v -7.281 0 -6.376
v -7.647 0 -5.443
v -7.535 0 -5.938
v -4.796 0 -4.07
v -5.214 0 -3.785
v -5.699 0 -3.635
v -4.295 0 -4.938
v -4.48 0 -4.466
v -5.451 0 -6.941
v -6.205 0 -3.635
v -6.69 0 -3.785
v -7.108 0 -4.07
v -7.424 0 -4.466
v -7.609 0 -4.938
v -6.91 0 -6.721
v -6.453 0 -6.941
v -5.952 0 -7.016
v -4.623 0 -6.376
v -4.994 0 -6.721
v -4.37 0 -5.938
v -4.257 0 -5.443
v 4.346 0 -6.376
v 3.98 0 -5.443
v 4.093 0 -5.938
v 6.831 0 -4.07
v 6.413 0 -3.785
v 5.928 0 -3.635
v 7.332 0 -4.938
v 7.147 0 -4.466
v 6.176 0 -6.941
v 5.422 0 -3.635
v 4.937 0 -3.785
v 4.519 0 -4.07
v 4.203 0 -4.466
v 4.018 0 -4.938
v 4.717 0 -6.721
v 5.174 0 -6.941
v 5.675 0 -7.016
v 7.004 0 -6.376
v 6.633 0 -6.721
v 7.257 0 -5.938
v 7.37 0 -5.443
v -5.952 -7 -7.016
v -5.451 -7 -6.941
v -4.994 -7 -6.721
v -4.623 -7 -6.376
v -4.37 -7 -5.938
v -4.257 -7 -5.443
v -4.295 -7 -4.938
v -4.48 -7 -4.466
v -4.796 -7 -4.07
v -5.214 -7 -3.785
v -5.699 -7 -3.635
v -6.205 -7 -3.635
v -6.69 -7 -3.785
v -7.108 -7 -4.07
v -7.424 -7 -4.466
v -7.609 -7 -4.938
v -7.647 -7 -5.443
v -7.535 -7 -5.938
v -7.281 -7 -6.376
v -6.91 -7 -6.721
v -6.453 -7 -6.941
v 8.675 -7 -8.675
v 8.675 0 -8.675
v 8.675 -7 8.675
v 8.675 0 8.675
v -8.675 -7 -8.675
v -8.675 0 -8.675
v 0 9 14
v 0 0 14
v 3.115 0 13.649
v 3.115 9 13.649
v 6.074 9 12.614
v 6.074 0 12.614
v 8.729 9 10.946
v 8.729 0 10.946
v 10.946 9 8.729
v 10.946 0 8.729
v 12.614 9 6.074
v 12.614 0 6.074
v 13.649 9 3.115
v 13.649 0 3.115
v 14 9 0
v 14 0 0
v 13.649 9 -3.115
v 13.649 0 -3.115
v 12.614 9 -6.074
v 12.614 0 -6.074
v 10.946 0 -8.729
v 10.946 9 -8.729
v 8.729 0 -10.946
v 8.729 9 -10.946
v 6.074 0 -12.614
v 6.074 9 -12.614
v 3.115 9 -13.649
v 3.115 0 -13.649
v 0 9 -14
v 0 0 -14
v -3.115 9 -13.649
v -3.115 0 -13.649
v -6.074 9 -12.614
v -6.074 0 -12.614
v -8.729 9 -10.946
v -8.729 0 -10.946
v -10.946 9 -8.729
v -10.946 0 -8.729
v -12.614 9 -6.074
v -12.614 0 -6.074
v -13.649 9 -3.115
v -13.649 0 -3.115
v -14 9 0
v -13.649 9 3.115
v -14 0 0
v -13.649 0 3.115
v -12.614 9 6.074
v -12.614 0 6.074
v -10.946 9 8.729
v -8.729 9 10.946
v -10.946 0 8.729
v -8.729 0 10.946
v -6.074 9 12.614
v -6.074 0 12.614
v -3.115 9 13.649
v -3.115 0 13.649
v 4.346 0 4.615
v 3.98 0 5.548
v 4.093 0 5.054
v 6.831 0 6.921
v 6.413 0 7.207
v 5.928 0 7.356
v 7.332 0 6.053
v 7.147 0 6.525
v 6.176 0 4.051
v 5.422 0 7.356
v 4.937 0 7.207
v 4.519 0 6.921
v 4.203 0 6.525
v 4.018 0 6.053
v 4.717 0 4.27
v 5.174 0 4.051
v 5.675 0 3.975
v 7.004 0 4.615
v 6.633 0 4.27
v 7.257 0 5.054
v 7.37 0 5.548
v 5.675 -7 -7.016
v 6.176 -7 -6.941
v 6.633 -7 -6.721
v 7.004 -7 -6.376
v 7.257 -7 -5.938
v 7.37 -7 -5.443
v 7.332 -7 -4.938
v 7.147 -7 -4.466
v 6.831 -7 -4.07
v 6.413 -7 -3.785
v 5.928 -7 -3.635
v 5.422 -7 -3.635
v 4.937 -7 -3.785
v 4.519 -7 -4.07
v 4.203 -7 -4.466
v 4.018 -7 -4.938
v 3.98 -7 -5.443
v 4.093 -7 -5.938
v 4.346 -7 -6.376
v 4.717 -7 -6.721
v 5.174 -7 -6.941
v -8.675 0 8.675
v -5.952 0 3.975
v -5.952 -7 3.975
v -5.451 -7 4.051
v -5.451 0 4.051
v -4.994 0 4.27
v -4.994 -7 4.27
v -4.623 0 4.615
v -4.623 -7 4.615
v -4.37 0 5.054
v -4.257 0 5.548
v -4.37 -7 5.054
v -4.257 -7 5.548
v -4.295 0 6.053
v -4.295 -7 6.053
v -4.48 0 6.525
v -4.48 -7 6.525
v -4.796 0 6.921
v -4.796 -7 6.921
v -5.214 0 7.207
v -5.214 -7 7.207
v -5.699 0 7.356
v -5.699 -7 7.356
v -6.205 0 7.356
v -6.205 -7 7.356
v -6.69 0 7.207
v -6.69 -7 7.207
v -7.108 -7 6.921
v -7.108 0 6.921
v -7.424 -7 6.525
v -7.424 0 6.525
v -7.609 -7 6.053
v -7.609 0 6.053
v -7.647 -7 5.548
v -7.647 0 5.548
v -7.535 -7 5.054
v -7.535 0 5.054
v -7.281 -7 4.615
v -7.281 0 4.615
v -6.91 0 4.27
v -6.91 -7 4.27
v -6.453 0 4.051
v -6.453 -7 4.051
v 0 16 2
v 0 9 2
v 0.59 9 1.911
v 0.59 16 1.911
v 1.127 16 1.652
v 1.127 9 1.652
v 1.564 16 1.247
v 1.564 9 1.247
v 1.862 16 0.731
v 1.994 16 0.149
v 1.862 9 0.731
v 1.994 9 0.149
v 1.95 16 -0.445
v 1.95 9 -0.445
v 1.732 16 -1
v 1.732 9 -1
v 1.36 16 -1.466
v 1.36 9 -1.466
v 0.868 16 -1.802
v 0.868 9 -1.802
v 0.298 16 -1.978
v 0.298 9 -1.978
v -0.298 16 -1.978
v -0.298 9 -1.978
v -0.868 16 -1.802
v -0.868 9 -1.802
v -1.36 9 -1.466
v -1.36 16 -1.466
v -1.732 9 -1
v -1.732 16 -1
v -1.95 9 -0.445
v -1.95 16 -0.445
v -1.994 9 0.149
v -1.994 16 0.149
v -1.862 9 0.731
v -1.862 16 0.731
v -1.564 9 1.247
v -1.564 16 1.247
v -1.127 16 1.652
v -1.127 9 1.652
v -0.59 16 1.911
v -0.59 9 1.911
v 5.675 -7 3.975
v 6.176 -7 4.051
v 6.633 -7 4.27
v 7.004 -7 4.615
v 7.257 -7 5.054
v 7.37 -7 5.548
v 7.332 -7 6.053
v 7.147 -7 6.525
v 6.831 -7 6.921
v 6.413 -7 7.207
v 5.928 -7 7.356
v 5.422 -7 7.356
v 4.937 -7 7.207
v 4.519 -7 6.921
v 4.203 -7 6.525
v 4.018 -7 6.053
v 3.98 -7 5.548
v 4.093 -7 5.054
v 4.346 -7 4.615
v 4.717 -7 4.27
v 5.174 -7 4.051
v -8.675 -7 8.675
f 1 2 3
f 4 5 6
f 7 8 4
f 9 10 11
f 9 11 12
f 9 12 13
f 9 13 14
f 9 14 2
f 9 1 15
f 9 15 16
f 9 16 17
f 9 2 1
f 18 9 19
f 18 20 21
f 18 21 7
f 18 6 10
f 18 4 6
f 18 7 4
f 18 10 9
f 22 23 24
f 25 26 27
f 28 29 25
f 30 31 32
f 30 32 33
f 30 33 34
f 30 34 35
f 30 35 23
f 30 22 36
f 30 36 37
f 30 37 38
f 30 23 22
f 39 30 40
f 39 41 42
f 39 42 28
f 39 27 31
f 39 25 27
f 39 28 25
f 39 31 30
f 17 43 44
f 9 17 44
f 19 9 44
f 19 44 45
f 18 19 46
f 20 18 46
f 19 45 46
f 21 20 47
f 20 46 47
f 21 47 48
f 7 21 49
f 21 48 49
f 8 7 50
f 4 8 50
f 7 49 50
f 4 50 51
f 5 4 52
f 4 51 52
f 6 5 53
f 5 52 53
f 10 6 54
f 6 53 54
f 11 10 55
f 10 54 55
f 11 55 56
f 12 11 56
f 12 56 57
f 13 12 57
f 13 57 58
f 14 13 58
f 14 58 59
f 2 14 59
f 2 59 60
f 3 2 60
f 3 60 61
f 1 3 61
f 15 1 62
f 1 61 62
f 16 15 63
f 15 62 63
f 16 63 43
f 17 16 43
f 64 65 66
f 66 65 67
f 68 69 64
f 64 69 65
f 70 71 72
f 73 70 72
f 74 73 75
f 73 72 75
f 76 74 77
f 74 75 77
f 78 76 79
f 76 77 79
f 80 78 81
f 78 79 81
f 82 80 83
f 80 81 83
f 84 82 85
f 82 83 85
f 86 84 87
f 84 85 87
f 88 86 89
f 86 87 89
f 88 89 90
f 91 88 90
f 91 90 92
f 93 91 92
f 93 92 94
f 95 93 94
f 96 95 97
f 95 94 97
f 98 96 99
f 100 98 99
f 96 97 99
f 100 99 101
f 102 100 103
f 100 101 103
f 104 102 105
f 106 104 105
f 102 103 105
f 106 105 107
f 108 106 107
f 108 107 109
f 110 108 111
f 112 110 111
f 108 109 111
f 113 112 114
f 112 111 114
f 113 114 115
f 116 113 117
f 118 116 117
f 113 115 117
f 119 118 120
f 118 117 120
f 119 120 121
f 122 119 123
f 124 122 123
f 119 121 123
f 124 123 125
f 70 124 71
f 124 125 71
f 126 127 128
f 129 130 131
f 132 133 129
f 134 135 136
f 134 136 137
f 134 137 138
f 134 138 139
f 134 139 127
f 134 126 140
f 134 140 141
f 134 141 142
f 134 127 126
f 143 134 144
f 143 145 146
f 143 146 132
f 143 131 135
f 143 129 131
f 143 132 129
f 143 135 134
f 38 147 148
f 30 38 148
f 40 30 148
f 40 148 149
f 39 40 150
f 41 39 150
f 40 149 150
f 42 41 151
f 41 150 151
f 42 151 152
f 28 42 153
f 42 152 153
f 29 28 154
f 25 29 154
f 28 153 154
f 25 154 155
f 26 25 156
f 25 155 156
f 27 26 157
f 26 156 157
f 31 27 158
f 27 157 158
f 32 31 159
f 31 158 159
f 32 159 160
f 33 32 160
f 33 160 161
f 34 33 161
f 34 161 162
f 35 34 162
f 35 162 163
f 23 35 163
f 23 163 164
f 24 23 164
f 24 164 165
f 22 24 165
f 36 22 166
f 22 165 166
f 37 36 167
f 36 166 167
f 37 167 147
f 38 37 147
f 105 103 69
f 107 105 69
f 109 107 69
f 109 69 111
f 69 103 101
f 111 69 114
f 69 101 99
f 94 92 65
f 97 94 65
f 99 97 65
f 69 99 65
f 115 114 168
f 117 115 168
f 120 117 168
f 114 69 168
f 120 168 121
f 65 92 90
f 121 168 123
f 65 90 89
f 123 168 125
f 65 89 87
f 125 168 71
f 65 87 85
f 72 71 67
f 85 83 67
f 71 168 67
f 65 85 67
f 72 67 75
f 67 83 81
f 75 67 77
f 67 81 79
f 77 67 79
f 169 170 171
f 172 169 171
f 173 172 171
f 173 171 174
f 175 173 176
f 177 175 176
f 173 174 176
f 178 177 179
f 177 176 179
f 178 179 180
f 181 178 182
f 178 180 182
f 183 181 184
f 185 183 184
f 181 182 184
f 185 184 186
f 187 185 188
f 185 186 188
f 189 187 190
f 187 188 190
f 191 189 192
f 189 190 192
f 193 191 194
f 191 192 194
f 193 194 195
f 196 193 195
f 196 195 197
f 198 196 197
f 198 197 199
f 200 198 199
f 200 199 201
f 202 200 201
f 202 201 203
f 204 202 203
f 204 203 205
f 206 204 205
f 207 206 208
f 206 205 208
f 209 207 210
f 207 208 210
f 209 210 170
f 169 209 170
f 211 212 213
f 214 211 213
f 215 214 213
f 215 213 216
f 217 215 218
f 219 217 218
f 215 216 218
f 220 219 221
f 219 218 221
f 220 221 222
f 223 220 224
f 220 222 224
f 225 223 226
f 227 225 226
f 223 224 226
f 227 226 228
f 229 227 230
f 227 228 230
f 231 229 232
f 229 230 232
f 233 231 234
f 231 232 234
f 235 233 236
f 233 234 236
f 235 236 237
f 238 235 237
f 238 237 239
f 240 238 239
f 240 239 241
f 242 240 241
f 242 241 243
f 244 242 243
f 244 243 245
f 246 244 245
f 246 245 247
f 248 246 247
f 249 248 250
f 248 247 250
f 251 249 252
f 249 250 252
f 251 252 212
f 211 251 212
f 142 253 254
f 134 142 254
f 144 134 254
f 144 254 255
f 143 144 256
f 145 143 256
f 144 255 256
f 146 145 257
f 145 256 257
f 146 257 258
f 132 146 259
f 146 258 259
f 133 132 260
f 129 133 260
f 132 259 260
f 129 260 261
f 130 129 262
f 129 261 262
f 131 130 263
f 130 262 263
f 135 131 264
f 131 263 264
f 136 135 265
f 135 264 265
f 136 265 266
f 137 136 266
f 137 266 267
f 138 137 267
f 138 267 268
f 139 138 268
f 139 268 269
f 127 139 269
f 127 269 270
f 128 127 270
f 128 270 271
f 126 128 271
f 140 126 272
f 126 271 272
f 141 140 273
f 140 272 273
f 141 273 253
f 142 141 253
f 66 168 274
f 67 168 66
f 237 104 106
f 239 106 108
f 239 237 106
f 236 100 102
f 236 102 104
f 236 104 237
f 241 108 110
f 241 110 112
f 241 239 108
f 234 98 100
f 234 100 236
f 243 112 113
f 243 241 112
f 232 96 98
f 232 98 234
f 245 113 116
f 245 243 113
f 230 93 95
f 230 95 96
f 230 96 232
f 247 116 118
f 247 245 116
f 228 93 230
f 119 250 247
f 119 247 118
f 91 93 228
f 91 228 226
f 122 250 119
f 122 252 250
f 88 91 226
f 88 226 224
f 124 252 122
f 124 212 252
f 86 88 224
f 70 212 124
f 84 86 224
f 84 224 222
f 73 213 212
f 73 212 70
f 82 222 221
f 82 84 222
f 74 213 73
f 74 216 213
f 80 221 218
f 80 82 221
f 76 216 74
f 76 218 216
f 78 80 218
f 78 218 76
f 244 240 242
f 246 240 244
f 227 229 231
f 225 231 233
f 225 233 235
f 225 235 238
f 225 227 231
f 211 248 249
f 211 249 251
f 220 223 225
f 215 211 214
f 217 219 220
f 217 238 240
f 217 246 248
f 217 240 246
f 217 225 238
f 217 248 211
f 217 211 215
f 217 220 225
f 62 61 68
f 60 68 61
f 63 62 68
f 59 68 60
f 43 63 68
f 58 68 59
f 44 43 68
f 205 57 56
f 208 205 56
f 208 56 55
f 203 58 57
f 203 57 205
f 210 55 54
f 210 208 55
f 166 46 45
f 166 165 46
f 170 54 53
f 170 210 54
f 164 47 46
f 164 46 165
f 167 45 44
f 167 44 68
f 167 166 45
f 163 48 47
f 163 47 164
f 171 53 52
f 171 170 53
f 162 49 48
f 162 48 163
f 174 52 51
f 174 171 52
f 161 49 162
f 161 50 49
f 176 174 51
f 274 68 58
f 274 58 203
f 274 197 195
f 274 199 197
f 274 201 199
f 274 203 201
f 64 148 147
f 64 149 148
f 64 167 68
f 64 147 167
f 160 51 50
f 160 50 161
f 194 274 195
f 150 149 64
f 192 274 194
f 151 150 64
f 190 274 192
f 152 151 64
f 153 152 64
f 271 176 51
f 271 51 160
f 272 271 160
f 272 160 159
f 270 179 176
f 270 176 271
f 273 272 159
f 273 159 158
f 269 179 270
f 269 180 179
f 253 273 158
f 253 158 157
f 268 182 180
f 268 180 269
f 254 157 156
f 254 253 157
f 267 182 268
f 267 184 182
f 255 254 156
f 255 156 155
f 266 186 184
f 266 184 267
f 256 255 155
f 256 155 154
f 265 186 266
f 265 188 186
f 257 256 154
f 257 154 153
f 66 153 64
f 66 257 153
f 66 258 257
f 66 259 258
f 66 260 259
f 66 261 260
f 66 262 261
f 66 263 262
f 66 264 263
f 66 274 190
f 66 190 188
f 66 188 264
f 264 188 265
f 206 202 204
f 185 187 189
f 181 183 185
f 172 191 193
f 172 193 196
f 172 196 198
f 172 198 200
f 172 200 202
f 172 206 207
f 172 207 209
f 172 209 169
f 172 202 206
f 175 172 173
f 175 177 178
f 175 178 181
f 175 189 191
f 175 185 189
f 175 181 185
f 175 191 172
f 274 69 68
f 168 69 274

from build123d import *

# Parameters (mm, degrees)
SKETCH1_R           = 14
BOSS_EXTRUDE1_DEPTH = 9
SKETCH3_W           = 17.35
SKETCH3_H           = 17.35
BOSS_EXTRUDE2_DEPTH = 7
SKETCH4_R           = 1.7
CUT_EXTRUDE1_DEPTH  = 7
SKETCH5_R           = 2
BOSS_EXTRUDE3_DEPTH = 7


with BuildPart() as part:
    # Sketch1 → Boss-Extrude1 (new body)
    with BuildSketch(Plane(origin=(0, 0, 0), x_dir=(1, 0, 0), z_dir=(0, 1, 0))):
        with Locations(Location((0, 0, 0), (0, 0, 270))):
            Circle(SKETCH1_R)
    extrude(amount=BOSS_EXTRUDE1_DEPTH)

    # Sketch3 → Boss-Extrude2 (add)
    with BuildSketch(Plane.XZ):
        Rectangle(SKETCH3_W, SKETCH3_H)
    extrude(amount=BOSS_EXTRUDE2_DEPTH)

    # Sketch4 → Cut-Extrude1 (cut)
    with BuildSketch(Plane.XZ.offset(7)):
        with Locations(Location((-5.952043792, 5.675, 0), (0, 0, 270))):
            Circle(SKETCH4_R)
        with Locations(Location((-5.952043792, -5.316444521, 0), (0, 0, 270))):
            Circle(SKETCH4_R)
        with Locations(Location((5.675, -5.316444521, 0), (0, 0, 270))):
            Circle(SKETCH4_R)
        with Locations(Location((5.675, 5.675, 0), (0, 0, 270))):
            Circle(SKETCH4_R)
    extrude(amount=-CUT_EXTRUDE1_DEPTH, mode=Mode.SUBTRACT)

    # Sketch5 → Boss-Extrude3 (add)
    with BuildSketch(Plane(origin=(0, 9, 0), x_dir=(1, 0, 0), z_dir=(0, 1, 0))):
        with Locations(Location((0, 0, 0), (0, 0, 270))):
            Circle(SKETCH5_R)
    extrude(amount=BOSS_EXTRUDE3_DEPTH)


solid = part.part
